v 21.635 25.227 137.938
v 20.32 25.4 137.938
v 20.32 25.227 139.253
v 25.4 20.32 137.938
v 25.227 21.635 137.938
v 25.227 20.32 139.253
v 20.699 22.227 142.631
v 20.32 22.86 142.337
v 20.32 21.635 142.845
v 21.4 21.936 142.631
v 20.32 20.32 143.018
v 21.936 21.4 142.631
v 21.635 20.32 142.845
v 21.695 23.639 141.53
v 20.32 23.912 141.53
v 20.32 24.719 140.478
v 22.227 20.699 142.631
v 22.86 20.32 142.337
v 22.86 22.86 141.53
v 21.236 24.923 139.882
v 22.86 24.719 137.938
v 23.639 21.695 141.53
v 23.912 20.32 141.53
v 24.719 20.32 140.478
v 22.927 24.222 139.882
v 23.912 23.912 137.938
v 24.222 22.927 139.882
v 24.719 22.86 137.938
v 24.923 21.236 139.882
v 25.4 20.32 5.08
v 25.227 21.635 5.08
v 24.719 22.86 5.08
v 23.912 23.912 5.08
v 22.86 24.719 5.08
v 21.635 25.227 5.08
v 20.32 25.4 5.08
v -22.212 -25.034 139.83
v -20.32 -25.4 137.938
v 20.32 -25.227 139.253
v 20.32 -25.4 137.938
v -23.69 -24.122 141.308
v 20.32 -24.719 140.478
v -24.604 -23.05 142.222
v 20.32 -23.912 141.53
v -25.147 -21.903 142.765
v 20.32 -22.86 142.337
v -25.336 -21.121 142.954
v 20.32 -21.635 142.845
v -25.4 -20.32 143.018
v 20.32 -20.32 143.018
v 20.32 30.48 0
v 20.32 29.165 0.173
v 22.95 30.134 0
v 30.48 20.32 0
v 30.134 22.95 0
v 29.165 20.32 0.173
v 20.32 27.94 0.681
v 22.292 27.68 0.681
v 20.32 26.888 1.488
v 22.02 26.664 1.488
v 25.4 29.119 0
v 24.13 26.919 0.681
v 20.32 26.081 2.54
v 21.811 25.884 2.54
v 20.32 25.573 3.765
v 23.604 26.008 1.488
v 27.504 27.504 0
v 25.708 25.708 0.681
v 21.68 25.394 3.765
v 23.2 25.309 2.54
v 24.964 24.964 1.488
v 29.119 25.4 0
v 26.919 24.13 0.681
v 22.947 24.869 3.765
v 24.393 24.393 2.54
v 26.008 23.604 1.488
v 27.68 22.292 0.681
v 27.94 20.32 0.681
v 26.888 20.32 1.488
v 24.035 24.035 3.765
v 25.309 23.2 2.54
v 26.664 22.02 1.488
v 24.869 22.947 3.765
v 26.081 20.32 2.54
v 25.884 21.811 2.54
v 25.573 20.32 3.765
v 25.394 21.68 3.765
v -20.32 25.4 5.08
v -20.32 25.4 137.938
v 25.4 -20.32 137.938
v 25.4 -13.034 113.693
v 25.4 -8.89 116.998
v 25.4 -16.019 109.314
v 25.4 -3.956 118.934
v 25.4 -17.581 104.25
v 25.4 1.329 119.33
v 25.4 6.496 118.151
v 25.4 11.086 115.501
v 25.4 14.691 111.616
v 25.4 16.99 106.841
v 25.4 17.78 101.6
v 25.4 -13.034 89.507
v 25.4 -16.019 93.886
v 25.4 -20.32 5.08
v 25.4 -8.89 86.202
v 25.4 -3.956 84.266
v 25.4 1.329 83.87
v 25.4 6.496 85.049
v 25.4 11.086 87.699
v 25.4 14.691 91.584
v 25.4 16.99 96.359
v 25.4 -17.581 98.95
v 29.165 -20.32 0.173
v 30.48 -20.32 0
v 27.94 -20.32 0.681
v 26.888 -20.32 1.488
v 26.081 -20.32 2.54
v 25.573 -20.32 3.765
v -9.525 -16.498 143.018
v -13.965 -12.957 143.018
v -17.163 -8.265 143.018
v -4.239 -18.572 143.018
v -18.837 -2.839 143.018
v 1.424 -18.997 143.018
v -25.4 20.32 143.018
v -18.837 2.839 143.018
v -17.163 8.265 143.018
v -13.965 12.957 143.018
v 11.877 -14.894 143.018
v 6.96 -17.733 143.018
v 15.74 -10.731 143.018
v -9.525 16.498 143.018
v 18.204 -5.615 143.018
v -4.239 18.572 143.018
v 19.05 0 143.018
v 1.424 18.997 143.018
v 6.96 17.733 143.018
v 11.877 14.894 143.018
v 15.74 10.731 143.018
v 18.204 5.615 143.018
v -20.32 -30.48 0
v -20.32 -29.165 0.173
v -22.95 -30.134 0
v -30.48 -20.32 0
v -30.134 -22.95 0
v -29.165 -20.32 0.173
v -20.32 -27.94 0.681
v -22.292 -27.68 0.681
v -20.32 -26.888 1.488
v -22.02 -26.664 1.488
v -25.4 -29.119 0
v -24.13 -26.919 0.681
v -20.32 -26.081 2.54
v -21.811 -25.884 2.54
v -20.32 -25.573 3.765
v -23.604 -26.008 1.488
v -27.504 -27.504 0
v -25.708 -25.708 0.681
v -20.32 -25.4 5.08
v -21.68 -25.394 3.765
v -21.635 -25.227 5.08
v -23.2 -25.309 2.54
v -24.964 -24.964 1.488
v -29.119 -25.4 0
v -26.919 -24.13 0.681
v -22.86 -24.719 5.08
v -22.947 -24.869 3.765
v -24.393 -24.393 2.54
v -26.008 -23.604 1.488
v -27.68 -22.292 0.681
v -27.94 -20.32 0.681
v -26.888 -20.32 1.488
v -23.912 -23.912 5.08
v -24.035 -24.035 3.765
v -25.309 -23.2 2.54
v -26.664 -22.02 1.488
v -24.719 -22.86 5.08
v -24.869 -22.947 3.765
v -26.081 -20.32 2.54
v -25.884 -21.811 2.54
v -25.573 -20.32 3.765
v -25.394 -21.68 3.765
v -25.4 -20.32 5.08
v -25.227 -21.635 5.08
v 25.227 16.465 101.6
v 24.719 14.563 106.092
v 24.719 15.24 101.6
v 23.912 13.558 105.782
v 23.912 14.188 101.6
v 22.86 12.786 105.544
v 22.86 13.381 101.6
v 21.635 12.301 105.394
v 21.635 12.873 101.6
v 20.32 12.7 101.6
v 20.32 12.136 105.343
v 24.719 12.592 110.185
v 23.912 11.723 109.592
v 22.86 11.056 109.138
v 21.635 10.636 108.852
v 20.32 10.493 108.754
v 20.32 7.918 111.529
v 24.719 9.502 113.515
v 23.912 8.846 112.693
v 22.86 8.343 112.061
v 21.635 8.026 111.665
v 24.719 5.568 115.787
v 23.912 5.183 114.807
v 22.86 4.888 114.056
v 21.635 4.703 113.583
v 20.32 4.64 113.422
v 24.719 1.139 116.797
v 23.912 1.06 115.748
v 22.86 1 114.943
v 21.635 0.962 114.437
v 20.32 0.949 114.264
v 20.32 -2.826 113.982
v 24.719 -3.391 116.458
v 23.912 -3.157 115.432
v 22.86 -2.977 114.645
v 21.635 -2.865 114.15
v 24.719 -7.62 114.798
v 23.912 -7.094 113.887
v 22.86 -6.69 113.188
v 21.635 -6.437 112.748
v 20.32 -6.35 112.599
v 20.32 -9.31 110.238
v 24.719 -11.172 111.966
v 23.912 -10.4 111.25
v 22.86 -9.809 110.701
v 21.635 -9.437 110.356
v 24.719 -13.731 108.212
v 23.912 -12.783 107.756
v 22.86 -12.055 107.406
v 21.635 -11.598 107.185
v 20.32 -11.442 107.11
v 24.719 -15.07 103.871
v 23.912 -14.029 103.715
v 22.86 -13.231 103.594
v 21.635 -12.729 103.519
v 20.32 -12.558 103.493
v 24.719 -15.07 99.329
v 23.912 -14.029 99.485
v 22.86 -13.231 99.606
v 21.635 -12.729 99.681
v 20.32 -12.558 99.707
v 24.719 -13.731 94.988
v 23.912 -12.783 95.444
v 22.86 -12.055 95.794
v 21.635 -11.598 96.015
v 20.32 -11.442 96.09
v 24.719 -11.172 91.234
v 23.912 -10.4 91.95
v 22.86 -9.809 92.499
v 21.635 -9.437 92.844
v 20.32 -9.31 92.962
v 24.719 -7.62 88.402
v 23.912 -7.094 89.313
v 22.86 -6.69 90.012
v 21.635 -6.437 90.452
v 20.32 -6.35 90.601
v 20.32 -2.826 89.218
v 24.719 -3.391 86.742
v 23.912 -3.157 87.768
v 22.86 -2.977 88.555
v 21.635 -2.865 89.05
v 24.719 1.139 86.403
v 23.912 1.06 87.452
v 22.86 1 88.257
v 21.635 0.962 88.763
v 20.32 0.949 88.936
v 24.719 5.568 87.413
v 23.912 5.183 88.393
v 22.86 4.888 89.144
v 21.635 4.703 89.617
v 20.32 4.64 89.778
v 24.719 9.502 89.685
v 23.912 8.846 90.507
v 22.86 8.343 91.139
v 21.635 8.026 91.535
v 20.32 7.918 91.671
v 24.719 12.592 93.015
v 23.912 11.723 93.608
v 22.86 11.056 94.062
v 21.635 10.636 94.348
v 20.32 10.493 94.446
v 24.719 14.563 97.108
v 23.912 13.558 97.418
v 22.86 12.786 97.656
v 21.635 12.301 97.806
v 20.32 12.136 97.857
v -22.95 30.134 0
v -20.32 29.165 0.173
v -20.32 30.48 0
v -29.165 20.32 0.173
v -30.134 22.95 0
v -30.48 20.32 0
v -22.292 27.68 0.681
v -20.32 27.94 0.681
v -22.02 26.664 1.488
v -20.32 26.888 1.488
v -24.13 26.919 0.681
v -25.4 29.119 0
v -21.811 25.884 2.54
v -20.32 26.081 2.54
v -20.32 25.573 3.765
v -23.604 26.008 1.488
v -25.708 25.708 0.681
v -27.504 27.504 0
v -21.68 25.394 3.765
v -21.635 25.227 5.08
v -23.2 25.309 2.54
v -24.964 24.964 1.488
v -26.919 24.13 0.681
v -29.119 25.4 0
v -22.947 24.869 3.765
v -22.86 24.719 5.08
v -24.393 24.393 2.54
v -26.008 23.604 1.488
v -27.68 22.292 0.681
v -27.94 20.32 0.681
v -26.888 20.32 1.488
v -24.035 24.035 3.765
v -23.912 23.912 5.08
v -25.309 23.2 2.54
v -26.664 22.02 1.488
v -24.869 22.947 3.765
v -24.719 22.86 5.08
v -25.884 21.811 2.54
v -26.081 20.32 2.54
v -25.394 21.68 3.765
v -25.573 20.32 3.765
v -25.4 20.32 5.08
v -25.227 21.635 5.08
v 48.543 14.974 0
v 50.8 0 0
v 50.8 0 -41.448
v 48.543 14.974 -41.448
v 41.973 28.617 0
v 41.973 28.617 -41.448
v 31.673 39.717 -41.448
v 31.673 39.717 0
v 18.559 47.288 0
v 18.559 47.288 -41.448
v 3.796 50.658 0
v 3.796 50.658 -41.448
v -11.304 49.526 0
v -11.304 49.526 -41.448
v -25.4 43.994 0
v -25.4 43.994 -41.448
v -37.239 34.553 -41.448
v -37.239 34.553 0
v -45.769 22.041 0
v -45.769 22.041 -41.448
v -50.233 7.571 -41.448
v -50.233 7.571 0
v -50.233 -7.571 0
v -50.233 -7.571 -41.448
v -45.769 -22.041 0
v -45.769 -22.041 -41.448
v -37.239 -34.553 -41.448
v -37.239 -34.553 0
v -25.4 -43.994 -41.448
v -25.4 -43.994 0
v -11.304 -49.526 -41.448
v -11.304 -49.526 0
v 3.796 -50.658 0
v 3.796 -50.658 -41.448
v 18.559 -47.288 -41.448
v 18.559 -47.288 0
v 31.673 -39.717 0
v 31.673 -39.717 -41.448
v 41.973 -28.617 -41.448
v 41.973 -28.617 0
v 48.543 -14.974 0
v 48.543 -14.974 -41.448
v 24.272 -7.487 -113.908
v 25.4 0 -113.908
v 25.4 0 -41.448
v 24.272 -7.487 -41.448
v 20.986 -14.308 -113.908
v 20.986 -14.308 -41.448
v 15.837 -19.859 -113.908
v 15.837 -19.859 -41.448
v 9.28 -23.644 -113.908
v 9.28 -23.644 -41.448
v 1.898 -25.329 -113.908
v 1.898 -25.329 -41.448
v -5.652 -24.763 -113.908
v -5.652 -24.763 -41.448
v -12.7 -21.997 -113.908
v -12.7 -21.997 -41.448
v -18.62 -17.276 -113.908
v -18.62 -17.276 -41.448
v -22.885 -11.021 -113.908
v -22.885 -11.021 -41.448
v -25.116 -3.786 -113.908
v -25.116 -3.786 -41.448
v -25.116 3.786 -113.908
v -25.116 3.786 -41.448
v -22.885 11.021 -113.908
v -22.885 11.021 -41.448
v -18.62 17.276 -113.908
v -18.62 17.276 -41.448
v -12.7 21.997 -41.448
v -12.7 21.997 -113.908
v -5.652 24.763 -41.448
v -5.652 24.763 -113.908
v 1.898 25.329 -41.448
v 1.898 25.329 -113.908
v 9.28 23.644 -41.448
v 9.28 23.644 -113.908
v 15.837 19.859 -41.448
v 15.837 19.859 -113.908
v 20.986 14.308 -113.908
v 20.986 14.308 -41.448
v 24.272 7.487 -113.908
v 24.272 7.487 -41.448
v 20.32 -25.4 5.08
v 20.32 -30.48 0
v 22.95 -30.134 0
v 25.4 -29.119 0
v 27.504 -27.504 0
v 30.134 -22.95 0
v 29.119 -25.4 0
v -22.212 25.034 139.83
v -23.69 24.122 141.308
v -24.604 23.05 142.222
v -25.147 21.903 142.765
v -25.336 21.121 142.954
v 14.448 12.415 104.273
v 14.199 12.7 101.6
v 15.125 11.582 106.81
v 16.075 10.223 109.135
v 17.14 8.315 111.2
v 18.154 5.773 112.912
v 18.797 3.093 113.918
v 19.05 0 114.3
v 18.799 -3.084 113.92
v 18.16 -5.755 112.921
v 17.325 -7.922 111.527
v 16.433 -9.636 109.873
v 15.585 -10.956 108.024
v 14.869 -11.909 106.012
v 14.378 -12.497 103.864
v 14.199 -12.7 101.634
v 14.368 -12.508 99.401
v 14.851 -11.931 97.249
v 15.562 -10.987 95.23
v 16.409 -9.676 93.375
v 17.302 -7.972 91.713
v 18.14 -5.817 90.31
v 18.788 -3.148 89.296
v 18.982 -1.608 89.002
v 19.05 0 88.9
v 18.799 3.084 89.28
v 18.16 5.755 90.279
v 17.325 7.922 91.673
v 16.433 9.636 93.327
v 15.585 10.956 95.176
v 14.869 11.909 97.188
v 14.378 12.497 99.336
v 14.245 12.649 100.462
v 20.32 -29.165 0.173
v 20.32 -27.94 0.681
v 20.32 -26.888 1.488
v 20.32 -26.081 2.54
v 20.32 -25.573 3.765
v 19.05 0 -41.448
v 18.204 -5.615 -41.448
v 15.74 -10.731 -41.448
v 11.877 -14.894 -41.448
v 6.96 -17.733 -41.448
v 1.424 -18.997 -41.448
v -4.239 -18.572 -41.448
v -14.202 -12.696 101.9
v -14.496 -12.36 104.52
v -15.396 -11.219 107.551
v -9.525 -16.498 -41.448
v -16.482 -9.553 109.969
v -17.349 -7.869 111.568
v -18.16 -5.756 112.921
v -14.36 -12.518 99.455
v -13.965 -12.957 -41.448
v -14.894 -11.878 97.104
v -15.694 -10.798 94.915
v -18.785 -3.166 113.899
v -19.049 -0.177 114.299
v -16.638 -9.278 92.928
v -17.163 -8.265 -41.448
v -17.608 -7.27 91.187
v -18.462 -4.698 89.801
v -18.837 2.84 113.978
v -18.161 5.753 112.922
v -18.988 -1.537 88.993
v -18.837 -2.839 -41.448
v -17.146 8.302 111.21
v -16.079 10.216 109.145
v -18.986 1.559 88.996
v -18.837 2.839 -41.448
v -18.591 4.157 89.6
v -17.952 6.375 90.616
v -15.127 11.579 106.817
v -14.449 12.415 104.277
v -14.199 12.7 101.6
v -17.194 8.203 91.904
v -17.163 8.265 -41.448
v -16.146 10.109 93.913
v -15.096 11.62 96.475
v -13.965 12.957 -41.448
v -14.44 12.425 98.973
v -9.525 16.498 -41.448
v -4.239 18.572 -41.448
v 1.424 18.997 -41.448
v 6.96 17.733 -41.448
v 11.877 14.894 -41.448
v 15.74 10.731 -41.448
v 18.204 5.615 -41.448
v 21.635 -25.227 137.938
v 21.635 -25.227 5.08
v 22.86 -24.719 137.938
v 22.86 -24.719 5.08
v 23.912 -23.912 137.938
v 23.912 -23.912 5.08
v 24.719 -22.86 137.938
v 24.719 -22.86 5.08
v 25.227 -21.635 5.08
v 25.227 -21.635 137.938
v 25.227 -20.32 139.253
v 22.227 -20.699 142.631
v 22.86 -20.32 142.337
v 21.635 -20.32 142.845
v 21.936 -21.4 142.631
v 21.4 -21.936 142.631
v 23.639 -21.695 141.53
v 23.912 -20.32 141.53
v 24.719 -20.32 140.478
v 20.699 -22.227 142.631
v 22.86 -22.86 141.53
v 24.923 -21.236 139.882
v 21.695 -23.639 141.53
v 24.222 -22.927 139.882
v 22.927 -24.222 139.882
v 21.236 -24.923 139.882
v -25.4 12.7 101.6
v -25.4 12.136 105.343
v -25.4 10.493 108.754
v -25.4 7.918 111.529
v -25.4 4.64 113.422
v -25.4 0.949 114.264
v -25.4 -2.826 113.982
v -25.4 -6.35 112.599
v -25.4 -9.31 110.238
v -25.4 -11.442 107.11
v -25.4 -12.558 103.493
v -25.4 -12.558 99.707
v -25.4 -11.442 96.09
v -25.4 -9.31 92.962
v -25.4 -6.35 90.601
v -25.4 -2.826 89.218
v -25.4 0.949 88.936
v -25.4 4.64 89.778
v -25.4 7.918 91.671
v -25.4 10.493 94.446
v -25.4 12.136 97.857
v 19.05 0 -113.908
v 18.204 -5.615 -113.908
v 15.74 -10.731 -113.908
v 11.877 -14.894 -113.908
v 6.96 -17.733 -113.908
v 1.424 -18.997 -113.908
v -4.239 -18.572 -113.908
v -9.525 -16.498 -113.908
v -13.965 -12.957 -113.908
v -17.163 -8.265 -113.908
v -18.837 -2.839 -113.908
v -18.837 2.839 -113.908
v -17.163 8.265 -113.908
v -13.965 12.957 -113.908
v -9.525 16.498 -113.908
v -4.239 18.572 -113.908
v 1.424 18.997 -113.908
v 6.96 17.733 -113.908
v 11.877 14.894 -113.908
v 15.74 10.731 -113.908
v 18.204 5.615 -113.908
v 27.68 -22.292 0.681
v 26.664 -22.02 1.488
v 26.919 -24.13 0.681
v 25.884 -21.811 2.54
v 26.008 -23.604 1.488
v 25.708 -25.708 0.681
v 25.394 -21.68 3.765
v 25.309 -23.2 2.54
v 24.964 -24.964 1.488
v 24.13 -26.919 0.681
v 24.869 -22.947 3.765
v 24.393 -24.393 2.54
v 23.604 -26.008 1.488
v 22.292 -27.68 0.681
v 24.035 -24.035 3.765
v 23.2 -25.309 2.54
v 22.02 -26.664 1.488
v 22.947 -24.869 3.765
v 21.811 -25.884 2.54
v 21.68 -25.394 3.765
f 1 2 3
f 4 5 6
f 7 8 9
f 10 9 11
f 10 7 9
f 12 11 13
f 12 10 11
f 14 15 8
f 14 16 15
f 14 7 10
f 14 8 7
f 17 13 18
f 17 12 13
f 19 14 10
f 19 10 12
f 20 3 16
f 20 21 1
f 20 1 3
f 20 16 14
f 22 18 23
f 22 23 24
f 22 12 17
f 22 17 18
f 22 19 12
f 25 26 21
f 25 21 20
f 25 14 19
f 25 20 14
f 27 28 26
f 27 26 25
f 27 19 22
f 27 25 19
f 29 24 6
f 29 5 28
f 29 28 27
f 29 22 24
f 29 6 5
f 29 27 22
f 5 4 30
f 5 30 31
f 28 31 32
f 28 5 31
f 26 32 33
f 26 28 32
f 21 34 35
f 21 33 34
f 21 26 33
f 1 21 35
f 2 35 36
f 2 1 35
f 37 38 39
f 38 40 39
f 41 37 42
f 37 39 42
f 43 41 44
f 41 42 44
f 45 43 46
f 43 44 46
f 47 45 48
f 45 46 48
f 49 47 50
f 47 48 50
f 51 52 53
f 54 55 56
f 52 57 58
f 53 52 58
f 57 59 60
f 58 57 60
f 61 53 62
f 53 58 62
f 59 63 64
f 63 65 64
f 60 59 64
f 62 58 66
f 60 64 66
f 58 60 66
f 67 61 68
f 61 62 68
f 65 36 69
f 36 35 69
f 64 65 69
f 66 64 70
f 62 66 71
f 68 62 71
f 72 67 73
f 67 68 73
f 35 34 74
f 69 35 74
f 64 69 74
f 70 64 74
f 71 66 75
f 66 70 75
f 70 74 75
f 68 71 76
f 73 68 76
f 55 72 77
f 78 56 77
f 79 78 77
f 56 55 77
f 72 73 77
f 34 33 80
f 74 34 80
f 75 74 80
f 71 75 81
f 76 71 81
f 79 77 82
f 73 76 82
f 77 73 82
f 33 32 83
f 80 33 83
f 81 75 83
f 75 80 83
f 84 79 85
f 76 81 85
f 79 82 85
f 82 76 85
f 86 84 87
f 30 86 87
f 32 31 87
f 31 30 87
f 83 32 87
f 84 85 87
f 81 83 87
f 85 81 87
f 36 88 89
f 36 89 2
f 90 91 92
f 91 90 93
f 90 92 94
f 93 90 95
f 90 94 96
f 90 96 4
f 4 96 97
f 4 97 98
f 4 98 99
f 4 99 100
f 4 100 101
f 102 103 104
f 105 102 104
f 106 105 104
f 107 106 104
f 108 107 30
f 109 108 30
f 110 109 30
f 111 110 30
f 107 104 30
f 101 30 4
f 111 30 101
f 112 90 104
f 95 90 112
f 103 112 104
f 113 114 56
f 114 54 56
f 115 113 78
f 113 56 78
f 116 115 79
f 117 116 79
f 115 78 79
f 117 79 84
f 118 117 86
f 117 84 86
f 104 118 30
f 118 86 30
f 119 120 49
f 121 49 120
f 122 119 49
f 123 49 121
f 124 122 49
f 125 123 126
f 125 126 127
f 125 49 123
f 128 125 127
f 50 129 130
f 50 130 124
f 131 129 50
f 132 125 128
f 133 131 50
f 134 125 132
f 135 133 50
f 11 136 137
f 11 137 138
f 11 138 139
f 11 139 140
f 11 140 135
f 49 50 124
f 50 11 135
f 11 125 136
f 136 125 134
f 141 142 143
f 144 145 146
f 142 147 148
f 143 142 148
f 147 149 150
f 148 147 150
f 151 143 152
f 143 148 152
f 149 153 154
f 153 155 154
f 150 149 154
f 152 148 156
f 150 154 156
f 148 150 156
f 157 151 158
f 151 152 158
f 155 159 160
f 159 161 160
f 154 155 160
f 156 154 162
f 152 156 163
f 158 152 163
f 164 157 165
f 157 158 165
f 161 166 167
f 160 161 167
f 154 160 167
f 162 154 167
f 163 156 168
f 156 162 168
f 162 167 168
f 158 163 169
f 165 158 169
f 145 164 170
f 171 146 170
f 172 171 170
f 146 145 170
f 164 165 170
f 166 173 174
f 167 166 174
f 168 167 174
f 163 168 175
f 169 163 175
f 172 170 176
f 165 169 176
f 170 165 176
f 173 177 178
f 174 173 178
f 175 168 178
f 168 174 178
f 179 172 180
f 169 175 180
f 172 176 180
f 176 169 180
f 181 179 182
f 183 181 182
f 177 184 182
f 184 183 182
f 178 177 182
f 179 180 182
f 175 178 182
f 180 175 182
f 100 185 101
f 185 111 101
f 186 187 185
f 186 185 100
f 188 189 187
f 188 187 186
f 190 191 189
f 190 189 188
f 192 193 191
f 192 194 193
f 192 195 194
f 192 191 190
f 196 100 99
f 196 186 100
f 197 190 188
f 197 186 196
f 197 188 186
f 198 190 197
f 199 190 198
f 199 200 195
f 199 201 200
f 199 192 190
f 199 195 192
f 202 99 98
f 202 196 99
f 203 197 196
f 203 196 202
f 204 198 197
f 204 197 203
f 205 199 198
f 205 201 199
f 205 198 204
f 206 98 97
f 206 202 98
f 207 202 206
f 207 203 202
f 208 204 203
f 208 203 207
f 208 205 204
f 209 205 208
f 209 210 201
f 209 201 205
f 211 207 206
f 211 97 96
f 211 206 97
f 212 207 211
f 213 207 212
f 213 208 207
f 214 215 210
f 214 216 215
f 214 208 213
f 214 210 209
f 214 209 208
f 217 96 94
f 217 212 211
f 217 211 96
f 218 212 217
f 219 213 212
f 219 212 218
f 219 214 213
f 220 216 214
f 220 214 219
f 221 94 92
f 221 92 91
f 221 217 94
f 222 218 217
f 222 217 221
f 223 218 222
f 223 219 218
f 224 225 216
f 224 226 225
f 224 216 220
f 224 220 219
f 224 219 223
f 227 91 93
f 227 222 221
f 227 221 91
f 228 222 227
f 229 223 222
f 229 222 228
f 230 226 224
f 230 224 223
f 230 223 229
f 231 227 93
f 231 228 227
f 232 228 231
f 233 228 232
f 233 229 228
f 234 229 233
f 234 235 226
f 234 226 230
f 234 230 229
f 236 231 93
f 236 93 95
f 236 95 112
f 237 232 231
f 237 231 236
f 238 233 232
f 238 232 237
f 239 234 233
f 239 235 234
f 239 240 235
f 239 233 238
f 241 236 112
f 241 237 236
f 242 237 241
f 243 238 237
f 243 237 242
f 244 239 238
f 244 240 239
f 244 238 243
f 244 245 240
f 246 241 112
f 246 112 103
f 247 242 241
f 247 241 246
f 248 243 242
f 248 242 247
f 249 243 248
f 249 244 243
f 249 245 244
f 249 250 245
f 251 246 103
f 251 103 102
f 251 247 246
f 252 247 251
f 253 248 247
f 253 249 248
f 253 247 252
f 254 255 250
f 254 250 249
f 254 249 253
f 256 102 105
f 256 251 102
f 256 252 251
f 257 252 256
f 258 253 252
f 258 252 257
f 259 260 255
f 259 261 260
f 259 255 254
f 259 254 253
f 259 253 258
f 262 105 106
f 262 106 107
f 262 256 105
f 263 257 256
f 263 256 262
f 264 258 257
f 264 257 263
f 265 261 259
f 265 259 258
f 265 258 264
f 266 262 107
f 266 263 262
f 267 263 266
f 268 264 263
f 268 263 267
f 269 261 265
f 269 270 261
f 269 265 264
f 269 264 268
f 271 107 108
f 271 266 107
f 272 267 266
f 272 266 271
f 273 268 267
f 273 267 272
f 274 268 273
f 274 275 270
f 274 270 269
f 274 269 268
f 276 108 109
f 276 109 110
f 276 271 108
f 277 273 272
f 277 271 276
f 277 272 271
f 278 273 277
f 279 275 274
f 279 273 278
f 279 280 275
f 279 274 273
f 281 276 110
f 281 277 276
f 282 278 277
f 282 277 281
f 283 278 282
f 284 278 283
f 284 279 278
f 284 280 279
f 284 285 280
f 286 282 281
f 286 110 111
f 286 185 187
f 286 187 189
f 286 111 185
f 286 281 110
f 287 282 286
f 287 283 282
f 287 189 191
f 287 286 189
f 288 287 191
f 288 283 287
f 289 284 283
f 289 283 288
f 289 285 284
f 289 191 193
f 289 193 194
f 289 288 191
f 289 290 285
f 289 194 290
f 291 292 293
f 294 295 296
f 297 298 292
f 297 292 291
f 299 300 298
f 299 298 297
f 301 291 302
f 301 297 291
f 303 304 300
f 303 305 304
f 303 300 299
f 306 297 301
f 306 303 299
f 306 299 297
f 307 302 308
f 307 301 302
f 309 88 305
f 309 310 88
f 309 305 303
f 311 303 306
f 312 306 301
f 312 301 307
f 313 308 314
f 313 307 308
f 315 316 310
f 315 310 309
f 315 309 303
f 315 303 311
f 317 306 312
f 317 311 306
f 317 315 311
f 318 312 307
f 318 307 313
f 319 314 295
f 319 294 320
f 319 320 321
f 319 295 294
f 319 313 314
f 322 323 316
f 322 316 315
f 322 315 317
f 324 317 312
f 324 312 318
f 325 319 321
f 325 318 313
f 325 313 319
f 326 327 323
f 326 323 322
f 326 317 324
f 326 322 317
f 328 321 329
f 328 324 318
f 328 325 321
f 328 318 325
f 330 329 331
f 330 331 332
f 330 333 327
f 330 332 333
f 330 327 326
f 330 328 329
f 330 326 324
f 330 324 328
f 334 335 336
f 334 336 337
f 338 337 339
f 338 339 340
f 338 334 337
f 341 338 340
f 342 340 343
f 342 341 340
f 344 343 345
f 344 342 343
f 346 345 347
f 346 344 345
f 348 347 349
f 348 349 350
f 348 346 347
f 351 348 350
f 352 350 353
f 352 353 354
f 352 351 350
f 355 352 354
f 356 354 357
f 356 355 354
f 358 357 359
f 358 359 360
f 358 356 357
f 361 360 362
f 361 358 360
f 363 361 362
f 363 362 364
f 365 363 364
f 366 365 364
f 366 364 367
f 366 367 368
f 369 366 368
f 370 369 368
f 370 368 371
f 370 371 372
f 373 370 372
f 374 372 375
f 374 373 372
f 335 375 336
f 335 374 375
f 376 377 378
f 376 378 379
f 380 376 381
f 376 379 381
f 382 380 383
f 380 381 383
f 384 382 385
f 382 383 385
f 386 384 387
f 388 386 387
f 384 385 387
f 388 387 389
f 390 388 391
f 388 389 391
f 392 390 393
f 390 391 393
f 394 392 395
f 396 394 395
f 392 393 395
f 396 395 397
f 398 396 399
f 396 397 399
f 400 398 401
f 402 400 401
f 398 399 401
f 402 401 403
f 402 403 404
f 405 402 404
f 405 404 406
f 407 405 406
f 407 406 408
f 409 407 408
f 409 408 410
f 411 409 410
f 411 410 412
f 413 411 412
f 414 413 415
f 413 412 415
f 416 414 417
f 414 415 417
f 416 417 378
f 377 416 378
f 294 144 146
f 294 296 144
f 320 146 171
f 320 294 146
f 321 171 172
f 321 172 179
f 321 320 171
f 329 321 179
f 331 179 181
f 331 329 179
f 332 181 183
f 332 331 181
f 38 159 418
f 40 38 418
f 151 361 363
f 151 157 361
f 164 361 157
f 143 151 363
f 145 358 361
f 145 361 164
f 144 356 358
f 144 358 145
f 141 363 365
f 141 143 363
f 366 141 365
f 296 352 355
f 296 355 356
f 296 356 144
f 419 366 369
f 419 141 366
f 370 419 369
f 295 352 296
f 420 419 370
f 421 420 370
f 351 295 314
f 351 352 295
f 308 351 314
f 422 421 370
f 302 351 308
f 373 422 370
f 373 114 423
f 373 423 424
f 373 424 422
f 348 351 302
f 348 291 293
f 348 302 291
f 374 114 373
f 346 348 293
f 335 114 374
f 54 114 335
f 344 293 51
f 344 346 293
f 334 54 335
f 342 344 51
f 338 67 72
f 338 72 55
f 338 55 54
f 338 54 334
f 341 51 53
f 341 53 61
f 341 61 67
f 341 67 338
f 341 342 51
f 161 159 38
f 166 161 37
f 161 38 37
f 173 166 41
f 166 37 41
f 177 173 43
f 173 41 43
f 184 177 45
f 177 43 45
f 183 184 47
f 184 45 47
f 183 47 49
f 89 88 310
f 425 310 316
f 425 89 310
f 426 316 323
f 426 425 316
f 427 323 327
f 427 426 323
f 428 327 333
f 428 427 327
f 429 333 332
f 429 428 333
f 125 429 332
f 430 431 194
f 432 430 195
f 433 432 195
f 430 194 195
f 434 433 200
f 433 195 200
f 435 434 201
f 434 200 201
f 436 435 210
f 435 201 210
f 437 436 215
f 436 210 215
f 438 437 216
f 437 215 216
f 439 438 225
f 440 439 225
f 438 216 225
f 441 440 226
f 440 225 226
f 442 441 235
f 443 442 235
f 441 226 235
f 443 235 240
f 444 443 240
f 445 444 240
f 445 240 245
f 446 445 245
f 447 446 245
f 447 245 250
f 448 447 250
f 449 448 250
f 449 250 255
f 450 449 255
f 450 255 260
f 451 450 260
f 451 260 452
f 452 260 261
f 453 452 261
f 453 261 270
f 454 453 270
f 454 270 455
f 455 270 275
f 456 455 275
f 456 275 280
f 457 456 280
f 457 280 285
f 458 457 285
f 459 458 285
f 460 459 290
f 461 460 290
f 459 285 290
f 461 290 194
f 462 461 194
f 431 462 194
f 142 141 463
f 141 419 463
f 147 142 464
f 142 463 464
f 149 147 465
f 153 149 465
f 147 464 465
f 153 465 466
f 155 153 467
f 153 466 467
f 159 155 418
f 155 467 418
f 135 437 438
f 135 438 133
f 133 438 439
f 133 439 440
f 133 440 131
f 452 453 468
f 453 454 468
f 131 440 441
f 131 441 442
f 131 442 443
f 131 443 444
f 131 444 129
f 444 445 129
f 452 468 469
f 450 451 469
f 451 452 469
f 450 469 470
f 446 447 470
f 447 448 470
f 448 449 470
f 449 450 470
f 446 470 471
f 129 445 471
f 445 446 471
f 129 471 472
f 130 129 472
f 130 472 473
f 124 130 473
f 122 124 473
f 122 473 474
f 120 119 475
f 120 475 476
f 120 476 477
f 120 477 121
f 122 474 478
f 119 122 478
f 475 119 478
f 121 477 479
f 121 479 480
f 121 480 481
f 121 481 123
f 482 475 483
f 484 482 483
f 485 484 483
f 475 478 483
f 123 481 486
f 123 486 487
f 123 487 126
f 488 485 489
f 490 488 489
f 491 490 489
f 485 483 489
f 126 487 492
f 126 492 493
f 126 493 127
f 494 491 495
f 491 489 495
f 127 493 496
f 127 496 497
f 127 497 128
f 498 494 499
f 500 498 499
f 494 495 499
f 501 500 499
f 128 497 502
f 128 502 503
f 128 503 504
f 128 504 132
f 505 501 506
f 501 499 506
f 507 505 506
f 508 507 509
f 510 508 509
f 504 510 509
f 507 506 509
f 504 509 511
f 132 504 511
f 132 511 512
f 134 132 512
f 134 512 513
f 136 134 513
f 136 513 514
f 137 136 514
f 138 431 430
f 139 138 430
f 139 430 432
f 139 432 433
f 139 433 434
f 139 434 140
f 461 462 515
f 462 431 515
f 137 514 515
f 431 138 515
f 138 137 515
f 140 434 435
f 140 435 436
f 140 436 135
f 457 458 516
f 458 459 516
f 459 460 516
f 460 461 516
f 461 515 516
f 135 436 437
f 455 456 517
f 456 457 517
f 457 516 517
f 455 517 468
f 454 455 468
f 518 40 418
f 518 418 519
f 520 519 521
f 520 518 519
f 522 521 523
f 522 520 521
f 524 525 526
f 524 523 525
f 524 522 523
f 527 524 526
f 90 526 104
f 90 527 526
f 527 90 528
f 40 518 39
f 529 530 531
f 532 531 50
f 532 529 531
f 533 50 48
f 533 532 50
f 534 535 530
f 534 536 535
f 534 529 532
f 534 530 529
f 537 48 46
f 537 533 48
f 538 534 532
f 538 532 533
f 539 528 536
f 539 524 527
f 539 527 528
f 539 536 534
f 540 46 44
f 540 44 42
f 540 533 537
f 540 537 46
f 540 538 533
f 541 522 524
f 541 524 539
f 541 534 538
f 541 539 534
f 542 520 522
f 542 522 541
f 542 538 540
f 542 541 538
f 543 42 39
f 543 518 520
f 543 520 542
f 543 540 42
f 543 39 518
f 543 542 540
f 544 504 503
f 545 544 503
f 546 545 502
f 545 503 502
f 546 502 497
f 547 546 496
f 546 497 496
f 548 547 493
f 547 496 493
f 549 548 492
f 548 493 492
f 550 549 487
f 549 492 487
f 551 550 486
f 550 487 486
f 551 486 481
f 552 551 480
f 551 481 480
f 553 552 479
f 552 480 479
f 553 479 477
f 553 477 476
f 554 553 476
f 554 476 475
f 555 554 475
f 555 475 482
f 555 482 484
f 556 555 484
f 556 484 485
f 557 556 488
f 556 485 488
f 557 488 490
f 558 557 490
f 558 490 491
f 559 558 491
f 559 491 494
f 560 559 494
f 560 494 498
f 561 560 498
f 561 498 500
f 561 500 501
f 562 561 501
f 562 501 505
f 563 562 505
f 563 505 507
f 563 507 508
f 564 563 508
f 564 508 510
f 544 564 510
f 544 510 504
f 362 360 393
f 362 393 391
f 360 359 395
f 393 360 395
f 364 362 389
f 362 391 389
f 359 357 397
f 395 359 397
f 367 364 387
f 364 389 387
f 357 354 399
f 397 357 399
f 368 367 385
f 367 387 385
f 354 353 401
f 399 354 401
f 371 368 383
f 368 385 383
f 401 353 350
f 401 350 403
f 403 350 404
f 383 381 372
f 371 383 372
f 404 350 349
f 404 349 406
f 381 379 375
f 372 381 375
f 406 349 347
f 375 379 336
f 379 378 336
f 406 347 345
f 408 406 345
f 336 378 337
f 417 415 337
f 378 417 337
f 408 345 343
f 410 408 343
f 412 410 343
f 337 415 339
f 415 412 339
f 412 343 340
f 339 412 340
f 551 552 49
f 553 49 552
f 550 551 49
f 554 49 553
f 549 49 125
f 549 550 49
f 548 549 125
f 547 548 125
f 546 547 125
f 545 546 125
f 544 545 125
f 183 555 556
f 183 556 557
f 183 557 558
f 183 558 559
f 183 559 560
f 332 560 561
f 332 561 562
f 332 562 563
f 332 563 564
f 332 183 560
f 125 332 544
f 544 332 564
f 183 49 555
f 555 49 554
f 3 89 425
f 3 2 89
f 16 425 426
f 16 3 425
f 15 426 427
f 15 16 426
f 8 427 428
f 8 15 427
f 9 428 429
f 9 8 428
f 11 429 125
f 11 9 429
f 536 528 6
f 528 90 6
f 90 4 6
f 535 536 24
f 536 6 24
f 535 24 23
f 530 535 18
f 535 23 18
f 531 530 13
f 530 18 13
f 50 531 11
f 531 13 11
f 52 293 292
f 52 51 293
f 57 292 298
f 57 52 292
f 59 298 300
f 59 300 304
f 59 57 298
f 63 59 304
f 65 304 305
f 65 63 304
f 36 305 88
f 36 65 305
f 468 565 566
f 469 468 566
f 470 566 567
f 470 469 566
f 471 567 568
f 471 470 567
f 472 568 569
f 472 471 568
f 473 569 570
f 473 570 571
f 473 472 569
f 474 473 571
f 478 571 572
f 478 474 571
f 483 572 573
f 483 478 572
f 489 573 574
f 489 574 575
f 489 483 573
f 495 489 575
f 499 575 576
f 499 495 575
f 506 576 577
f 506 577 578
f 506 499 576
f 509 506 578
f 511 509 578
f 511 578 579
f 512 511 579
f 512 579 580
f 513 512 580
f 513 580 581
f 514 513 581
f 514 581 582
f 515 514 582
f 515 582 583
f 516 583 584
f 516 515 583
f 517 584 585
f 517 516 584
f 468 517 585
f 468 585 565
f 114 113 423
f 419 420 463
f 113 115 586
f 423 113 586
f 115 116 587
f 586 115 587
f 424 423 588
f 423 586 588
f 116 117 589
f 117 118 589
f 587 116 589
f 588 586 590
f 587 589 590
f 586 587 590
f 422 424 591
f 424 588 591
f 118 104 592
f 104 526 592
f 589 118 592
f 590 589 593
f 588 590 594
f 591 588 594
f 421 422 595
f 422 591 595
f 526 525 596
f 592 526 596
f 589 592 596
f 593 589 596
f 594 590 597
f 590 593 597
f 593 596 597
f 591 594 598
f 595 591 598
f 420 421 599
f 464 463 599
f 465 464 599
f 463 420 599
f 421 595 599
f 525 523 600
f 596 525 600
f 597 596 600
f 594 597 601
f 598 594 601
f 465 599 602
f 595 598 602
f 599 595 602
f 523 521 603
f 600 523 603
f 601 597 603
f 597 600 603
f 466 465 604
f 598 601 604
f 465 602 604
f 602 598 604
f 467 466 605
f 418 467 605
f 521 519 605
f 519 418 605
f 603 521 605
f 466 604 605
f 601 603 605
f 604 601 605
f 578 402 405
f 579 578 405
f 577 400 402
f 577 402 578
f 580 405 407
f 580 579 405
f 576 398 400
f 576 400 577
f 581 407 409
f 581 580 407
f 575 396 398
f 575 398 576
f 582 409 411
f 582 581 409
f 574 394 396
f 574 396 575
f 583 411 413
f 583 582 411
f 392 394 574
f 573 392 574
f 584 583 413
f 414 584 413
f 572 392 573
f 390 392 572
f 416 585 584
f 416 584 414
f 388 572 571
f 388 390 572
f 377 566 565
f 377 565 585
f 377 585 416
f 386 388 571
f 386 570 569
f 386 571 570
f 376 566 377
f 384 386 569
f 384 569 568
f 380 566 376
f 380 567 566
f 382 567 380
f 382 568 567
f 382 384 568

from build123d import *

# Parameters (mm, degrees)
F0_R      = 50.8
F1_DEPTH  = 41.4476916194
F2_W      = 50.8
F2_H      = 50.8
F3_DEPTH  = 143.017962575
F4_R      = 12.7
F5_DEPTH  = 76.201
F6_R      = 5.08
F7_R      = 19.05
F8_DEPTH  = 184.4666541944
F9_R      = 25.4
F9_R_2    = 19.05
F10_DEPTH = 72.4607035518


with BuildPart() as f1:
    # F0 (on Top) → F1 (new body)
    with BuildSketch(Plane.XY):
        Circle(F0_R)
    extrude(amount=-F1_DEPTH)

    # F2 (on face) → F3 (join)
    with BuildSketch(Plane.XY):
        Rectangle(F2_W, F2_H)
    extrude(amount=F3_DEPTH)

    # F4 (on face) → F5 (cut, through all)
    with BuildSketch(Plane.YZ.offset(25.4)):
        with Locations((0, 101.6)):
            Circle(F4_R)
    extrude(amount=-F5_DEPTH, mode=Mode.SUBTRACT)

    # F6
    f6_edges = [f1.edges().sort_by_distance(p)[0] for p in [
        (25.4, 25.4, 71.508981),
        (-25.4, 25.4, 71.508981),
        (0, 25.4, 0),
        (0, 25.4, 143.017963),
        (25.4, -25.4, 71.508981),
        (25.4, 0, 0),
        (25.4, 0, 143.017963),
        (25.4, -12.7, 101.6),
        (-25.4, -25.4, 71.508981),
        (0, -25.4, 0),
        (0, -25.4, 143.017963),
        (-25.4, 0, 0),
    ]]
    fillet(f6_edges, radius=F6_R)

    # F7 (on face) → F8 (cut, through all)
    with BuildSketch(Plane(origin=(0, 0, -41.4476916194), x_dir=(1, 0, 0), z_dir=(0, 0, -1))):
        Circle(F7_R)
    extrude(amount=-F8_DEPTH, mode=Mode.SUBTRACT)

    # F9 (on face) → F10 (join)
    with BuildSketch(Plane(origin=(0, 0, -41.4476916194), x_dir=(1, 0, 0), z_dir=(0, 0, -1))):
        Circle(F9_R)
        Circle(F9_R_2, mode=Mode.SUBTRACT)
    extrude(amount=F10_DEPTH)


solid = f1.part
